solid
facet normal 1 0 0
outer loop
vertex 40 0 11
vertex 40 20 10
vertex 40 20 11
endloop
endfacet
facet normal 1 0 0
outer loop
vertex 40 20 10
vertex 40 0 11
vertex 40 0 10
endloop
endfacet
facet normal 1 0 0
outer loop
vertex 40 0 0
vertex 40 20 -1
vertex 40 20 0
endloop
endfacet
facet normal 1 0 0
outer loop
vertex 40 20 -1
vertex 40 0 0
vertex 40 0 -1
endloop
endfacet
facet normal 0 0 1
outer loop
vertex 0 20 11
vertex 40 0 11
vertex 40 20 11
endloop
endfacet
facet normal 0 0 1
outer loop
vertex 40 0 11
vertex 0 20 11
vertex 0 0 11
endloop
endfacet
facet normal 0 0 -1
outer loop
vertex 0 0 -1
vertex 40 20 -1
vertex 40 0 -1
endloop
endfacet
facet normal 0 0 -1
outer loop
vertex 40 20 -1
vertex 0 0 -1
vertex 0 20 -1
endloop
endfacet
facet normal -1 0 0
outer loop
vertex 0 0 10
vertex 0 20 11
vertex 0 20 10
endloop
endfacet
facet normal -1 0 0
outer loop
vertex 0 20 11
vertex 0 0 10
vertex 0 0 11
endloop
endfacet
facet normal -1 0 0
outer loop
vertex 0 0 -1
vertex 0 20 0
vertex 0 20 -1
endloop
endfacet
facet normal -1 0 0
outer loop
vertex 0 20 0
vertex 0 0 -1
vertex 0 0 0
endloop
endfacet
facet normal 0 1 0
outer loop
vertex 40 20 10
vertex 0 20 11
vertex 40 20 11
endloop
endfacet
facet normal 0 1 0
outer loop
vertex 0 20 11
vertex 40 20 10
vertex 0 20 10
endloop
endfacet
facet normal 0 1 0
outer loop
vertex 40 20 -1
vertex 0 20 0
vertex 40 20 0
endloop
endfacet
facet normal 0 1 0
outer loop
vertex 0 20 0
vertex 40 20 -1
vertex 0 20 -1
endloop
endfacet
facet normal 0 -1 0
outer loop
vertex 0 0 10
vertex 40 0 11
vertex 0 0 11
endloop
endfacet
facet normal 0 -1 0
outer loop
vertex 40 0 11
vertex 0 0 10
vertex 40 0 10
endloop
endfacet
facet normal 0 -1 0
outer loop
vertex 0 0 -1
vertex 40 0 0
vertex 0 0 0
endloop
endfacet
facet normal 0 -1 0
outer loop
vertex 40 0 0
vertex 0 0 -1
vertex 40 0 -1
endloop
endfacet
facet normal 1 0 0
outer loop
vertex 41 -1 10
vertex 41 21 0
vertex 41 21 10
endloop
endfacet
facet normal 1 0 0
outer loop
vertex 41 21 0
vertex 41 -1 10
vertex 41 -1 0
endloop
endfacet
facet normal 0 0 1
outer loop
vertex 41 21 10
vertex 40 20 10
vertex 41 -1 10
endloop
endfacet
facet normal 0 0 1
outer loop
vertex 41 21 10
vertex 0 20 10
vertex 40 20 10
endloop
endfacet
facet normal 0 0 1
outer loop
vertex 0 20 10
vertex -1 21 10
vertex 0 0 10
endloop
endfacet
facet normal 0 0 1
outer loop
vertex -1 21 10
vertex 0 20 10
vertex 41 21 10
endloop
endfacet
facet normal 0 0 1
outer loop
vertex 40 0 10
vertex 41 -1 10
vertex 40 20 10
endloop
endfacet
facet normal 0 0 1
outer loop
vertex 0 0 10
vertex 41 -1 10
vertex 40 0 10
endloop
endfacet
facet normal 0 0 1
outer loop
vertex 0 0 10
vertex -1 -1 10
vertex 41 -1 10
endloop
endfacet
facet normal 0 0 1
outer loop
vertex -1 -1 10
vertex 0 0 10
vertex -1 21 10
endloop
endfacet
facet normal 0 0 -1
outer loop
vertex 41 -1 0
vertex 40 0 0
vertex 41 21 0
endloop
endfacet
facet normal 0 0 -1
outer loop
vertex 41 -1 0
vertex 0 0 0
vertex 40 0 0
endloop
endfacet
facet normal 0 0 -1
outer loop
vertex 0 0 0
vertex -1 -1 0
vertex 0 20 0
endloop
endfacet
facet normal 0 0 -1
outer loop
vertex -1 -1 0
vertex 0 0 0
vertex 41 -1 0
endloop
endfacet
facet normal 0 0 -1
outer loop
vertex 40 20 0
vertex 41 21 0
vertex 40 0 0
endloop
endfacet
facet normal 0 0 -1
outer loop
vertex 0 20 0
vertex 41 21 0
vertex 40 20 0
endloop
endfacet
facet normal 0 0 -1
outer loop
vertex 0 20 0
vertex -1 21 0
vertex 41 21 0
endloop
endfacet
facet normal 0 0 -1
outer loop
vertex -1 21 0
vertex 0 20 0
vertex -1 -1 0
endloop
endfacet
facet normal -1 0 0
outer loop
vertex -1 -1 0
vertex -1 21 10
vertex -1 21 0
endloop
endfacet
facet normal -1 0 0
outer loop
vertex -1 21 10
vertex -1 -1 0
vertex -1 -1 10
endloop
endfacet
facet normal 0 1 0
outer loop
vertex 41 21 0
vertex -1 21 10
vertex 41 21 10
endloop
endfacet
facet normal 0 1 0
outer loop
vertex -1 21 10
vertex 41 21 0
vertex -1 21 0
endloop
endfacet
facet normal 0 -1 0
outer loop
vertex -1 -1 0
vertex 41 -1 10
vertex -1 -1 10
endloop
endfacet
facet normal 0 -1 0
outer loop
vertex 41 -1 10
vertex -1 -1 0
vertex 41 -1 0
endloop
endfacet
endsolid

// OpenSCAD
// Unit of length: Unit.MM
union()
{
   color(c = [1.0, 0.0, 0.0, 1.0])
   {
      translate(v = [0.0, 0.0, -1.0])
      {
         cube(size = [40.0, 20.0, 12.0], center = false);
      }
   }
   translate(v = [-1.0, -1.0, 0.0])
   {
      cube(size = [42.0, 22.0, 10.0], center = false);
   }
}
